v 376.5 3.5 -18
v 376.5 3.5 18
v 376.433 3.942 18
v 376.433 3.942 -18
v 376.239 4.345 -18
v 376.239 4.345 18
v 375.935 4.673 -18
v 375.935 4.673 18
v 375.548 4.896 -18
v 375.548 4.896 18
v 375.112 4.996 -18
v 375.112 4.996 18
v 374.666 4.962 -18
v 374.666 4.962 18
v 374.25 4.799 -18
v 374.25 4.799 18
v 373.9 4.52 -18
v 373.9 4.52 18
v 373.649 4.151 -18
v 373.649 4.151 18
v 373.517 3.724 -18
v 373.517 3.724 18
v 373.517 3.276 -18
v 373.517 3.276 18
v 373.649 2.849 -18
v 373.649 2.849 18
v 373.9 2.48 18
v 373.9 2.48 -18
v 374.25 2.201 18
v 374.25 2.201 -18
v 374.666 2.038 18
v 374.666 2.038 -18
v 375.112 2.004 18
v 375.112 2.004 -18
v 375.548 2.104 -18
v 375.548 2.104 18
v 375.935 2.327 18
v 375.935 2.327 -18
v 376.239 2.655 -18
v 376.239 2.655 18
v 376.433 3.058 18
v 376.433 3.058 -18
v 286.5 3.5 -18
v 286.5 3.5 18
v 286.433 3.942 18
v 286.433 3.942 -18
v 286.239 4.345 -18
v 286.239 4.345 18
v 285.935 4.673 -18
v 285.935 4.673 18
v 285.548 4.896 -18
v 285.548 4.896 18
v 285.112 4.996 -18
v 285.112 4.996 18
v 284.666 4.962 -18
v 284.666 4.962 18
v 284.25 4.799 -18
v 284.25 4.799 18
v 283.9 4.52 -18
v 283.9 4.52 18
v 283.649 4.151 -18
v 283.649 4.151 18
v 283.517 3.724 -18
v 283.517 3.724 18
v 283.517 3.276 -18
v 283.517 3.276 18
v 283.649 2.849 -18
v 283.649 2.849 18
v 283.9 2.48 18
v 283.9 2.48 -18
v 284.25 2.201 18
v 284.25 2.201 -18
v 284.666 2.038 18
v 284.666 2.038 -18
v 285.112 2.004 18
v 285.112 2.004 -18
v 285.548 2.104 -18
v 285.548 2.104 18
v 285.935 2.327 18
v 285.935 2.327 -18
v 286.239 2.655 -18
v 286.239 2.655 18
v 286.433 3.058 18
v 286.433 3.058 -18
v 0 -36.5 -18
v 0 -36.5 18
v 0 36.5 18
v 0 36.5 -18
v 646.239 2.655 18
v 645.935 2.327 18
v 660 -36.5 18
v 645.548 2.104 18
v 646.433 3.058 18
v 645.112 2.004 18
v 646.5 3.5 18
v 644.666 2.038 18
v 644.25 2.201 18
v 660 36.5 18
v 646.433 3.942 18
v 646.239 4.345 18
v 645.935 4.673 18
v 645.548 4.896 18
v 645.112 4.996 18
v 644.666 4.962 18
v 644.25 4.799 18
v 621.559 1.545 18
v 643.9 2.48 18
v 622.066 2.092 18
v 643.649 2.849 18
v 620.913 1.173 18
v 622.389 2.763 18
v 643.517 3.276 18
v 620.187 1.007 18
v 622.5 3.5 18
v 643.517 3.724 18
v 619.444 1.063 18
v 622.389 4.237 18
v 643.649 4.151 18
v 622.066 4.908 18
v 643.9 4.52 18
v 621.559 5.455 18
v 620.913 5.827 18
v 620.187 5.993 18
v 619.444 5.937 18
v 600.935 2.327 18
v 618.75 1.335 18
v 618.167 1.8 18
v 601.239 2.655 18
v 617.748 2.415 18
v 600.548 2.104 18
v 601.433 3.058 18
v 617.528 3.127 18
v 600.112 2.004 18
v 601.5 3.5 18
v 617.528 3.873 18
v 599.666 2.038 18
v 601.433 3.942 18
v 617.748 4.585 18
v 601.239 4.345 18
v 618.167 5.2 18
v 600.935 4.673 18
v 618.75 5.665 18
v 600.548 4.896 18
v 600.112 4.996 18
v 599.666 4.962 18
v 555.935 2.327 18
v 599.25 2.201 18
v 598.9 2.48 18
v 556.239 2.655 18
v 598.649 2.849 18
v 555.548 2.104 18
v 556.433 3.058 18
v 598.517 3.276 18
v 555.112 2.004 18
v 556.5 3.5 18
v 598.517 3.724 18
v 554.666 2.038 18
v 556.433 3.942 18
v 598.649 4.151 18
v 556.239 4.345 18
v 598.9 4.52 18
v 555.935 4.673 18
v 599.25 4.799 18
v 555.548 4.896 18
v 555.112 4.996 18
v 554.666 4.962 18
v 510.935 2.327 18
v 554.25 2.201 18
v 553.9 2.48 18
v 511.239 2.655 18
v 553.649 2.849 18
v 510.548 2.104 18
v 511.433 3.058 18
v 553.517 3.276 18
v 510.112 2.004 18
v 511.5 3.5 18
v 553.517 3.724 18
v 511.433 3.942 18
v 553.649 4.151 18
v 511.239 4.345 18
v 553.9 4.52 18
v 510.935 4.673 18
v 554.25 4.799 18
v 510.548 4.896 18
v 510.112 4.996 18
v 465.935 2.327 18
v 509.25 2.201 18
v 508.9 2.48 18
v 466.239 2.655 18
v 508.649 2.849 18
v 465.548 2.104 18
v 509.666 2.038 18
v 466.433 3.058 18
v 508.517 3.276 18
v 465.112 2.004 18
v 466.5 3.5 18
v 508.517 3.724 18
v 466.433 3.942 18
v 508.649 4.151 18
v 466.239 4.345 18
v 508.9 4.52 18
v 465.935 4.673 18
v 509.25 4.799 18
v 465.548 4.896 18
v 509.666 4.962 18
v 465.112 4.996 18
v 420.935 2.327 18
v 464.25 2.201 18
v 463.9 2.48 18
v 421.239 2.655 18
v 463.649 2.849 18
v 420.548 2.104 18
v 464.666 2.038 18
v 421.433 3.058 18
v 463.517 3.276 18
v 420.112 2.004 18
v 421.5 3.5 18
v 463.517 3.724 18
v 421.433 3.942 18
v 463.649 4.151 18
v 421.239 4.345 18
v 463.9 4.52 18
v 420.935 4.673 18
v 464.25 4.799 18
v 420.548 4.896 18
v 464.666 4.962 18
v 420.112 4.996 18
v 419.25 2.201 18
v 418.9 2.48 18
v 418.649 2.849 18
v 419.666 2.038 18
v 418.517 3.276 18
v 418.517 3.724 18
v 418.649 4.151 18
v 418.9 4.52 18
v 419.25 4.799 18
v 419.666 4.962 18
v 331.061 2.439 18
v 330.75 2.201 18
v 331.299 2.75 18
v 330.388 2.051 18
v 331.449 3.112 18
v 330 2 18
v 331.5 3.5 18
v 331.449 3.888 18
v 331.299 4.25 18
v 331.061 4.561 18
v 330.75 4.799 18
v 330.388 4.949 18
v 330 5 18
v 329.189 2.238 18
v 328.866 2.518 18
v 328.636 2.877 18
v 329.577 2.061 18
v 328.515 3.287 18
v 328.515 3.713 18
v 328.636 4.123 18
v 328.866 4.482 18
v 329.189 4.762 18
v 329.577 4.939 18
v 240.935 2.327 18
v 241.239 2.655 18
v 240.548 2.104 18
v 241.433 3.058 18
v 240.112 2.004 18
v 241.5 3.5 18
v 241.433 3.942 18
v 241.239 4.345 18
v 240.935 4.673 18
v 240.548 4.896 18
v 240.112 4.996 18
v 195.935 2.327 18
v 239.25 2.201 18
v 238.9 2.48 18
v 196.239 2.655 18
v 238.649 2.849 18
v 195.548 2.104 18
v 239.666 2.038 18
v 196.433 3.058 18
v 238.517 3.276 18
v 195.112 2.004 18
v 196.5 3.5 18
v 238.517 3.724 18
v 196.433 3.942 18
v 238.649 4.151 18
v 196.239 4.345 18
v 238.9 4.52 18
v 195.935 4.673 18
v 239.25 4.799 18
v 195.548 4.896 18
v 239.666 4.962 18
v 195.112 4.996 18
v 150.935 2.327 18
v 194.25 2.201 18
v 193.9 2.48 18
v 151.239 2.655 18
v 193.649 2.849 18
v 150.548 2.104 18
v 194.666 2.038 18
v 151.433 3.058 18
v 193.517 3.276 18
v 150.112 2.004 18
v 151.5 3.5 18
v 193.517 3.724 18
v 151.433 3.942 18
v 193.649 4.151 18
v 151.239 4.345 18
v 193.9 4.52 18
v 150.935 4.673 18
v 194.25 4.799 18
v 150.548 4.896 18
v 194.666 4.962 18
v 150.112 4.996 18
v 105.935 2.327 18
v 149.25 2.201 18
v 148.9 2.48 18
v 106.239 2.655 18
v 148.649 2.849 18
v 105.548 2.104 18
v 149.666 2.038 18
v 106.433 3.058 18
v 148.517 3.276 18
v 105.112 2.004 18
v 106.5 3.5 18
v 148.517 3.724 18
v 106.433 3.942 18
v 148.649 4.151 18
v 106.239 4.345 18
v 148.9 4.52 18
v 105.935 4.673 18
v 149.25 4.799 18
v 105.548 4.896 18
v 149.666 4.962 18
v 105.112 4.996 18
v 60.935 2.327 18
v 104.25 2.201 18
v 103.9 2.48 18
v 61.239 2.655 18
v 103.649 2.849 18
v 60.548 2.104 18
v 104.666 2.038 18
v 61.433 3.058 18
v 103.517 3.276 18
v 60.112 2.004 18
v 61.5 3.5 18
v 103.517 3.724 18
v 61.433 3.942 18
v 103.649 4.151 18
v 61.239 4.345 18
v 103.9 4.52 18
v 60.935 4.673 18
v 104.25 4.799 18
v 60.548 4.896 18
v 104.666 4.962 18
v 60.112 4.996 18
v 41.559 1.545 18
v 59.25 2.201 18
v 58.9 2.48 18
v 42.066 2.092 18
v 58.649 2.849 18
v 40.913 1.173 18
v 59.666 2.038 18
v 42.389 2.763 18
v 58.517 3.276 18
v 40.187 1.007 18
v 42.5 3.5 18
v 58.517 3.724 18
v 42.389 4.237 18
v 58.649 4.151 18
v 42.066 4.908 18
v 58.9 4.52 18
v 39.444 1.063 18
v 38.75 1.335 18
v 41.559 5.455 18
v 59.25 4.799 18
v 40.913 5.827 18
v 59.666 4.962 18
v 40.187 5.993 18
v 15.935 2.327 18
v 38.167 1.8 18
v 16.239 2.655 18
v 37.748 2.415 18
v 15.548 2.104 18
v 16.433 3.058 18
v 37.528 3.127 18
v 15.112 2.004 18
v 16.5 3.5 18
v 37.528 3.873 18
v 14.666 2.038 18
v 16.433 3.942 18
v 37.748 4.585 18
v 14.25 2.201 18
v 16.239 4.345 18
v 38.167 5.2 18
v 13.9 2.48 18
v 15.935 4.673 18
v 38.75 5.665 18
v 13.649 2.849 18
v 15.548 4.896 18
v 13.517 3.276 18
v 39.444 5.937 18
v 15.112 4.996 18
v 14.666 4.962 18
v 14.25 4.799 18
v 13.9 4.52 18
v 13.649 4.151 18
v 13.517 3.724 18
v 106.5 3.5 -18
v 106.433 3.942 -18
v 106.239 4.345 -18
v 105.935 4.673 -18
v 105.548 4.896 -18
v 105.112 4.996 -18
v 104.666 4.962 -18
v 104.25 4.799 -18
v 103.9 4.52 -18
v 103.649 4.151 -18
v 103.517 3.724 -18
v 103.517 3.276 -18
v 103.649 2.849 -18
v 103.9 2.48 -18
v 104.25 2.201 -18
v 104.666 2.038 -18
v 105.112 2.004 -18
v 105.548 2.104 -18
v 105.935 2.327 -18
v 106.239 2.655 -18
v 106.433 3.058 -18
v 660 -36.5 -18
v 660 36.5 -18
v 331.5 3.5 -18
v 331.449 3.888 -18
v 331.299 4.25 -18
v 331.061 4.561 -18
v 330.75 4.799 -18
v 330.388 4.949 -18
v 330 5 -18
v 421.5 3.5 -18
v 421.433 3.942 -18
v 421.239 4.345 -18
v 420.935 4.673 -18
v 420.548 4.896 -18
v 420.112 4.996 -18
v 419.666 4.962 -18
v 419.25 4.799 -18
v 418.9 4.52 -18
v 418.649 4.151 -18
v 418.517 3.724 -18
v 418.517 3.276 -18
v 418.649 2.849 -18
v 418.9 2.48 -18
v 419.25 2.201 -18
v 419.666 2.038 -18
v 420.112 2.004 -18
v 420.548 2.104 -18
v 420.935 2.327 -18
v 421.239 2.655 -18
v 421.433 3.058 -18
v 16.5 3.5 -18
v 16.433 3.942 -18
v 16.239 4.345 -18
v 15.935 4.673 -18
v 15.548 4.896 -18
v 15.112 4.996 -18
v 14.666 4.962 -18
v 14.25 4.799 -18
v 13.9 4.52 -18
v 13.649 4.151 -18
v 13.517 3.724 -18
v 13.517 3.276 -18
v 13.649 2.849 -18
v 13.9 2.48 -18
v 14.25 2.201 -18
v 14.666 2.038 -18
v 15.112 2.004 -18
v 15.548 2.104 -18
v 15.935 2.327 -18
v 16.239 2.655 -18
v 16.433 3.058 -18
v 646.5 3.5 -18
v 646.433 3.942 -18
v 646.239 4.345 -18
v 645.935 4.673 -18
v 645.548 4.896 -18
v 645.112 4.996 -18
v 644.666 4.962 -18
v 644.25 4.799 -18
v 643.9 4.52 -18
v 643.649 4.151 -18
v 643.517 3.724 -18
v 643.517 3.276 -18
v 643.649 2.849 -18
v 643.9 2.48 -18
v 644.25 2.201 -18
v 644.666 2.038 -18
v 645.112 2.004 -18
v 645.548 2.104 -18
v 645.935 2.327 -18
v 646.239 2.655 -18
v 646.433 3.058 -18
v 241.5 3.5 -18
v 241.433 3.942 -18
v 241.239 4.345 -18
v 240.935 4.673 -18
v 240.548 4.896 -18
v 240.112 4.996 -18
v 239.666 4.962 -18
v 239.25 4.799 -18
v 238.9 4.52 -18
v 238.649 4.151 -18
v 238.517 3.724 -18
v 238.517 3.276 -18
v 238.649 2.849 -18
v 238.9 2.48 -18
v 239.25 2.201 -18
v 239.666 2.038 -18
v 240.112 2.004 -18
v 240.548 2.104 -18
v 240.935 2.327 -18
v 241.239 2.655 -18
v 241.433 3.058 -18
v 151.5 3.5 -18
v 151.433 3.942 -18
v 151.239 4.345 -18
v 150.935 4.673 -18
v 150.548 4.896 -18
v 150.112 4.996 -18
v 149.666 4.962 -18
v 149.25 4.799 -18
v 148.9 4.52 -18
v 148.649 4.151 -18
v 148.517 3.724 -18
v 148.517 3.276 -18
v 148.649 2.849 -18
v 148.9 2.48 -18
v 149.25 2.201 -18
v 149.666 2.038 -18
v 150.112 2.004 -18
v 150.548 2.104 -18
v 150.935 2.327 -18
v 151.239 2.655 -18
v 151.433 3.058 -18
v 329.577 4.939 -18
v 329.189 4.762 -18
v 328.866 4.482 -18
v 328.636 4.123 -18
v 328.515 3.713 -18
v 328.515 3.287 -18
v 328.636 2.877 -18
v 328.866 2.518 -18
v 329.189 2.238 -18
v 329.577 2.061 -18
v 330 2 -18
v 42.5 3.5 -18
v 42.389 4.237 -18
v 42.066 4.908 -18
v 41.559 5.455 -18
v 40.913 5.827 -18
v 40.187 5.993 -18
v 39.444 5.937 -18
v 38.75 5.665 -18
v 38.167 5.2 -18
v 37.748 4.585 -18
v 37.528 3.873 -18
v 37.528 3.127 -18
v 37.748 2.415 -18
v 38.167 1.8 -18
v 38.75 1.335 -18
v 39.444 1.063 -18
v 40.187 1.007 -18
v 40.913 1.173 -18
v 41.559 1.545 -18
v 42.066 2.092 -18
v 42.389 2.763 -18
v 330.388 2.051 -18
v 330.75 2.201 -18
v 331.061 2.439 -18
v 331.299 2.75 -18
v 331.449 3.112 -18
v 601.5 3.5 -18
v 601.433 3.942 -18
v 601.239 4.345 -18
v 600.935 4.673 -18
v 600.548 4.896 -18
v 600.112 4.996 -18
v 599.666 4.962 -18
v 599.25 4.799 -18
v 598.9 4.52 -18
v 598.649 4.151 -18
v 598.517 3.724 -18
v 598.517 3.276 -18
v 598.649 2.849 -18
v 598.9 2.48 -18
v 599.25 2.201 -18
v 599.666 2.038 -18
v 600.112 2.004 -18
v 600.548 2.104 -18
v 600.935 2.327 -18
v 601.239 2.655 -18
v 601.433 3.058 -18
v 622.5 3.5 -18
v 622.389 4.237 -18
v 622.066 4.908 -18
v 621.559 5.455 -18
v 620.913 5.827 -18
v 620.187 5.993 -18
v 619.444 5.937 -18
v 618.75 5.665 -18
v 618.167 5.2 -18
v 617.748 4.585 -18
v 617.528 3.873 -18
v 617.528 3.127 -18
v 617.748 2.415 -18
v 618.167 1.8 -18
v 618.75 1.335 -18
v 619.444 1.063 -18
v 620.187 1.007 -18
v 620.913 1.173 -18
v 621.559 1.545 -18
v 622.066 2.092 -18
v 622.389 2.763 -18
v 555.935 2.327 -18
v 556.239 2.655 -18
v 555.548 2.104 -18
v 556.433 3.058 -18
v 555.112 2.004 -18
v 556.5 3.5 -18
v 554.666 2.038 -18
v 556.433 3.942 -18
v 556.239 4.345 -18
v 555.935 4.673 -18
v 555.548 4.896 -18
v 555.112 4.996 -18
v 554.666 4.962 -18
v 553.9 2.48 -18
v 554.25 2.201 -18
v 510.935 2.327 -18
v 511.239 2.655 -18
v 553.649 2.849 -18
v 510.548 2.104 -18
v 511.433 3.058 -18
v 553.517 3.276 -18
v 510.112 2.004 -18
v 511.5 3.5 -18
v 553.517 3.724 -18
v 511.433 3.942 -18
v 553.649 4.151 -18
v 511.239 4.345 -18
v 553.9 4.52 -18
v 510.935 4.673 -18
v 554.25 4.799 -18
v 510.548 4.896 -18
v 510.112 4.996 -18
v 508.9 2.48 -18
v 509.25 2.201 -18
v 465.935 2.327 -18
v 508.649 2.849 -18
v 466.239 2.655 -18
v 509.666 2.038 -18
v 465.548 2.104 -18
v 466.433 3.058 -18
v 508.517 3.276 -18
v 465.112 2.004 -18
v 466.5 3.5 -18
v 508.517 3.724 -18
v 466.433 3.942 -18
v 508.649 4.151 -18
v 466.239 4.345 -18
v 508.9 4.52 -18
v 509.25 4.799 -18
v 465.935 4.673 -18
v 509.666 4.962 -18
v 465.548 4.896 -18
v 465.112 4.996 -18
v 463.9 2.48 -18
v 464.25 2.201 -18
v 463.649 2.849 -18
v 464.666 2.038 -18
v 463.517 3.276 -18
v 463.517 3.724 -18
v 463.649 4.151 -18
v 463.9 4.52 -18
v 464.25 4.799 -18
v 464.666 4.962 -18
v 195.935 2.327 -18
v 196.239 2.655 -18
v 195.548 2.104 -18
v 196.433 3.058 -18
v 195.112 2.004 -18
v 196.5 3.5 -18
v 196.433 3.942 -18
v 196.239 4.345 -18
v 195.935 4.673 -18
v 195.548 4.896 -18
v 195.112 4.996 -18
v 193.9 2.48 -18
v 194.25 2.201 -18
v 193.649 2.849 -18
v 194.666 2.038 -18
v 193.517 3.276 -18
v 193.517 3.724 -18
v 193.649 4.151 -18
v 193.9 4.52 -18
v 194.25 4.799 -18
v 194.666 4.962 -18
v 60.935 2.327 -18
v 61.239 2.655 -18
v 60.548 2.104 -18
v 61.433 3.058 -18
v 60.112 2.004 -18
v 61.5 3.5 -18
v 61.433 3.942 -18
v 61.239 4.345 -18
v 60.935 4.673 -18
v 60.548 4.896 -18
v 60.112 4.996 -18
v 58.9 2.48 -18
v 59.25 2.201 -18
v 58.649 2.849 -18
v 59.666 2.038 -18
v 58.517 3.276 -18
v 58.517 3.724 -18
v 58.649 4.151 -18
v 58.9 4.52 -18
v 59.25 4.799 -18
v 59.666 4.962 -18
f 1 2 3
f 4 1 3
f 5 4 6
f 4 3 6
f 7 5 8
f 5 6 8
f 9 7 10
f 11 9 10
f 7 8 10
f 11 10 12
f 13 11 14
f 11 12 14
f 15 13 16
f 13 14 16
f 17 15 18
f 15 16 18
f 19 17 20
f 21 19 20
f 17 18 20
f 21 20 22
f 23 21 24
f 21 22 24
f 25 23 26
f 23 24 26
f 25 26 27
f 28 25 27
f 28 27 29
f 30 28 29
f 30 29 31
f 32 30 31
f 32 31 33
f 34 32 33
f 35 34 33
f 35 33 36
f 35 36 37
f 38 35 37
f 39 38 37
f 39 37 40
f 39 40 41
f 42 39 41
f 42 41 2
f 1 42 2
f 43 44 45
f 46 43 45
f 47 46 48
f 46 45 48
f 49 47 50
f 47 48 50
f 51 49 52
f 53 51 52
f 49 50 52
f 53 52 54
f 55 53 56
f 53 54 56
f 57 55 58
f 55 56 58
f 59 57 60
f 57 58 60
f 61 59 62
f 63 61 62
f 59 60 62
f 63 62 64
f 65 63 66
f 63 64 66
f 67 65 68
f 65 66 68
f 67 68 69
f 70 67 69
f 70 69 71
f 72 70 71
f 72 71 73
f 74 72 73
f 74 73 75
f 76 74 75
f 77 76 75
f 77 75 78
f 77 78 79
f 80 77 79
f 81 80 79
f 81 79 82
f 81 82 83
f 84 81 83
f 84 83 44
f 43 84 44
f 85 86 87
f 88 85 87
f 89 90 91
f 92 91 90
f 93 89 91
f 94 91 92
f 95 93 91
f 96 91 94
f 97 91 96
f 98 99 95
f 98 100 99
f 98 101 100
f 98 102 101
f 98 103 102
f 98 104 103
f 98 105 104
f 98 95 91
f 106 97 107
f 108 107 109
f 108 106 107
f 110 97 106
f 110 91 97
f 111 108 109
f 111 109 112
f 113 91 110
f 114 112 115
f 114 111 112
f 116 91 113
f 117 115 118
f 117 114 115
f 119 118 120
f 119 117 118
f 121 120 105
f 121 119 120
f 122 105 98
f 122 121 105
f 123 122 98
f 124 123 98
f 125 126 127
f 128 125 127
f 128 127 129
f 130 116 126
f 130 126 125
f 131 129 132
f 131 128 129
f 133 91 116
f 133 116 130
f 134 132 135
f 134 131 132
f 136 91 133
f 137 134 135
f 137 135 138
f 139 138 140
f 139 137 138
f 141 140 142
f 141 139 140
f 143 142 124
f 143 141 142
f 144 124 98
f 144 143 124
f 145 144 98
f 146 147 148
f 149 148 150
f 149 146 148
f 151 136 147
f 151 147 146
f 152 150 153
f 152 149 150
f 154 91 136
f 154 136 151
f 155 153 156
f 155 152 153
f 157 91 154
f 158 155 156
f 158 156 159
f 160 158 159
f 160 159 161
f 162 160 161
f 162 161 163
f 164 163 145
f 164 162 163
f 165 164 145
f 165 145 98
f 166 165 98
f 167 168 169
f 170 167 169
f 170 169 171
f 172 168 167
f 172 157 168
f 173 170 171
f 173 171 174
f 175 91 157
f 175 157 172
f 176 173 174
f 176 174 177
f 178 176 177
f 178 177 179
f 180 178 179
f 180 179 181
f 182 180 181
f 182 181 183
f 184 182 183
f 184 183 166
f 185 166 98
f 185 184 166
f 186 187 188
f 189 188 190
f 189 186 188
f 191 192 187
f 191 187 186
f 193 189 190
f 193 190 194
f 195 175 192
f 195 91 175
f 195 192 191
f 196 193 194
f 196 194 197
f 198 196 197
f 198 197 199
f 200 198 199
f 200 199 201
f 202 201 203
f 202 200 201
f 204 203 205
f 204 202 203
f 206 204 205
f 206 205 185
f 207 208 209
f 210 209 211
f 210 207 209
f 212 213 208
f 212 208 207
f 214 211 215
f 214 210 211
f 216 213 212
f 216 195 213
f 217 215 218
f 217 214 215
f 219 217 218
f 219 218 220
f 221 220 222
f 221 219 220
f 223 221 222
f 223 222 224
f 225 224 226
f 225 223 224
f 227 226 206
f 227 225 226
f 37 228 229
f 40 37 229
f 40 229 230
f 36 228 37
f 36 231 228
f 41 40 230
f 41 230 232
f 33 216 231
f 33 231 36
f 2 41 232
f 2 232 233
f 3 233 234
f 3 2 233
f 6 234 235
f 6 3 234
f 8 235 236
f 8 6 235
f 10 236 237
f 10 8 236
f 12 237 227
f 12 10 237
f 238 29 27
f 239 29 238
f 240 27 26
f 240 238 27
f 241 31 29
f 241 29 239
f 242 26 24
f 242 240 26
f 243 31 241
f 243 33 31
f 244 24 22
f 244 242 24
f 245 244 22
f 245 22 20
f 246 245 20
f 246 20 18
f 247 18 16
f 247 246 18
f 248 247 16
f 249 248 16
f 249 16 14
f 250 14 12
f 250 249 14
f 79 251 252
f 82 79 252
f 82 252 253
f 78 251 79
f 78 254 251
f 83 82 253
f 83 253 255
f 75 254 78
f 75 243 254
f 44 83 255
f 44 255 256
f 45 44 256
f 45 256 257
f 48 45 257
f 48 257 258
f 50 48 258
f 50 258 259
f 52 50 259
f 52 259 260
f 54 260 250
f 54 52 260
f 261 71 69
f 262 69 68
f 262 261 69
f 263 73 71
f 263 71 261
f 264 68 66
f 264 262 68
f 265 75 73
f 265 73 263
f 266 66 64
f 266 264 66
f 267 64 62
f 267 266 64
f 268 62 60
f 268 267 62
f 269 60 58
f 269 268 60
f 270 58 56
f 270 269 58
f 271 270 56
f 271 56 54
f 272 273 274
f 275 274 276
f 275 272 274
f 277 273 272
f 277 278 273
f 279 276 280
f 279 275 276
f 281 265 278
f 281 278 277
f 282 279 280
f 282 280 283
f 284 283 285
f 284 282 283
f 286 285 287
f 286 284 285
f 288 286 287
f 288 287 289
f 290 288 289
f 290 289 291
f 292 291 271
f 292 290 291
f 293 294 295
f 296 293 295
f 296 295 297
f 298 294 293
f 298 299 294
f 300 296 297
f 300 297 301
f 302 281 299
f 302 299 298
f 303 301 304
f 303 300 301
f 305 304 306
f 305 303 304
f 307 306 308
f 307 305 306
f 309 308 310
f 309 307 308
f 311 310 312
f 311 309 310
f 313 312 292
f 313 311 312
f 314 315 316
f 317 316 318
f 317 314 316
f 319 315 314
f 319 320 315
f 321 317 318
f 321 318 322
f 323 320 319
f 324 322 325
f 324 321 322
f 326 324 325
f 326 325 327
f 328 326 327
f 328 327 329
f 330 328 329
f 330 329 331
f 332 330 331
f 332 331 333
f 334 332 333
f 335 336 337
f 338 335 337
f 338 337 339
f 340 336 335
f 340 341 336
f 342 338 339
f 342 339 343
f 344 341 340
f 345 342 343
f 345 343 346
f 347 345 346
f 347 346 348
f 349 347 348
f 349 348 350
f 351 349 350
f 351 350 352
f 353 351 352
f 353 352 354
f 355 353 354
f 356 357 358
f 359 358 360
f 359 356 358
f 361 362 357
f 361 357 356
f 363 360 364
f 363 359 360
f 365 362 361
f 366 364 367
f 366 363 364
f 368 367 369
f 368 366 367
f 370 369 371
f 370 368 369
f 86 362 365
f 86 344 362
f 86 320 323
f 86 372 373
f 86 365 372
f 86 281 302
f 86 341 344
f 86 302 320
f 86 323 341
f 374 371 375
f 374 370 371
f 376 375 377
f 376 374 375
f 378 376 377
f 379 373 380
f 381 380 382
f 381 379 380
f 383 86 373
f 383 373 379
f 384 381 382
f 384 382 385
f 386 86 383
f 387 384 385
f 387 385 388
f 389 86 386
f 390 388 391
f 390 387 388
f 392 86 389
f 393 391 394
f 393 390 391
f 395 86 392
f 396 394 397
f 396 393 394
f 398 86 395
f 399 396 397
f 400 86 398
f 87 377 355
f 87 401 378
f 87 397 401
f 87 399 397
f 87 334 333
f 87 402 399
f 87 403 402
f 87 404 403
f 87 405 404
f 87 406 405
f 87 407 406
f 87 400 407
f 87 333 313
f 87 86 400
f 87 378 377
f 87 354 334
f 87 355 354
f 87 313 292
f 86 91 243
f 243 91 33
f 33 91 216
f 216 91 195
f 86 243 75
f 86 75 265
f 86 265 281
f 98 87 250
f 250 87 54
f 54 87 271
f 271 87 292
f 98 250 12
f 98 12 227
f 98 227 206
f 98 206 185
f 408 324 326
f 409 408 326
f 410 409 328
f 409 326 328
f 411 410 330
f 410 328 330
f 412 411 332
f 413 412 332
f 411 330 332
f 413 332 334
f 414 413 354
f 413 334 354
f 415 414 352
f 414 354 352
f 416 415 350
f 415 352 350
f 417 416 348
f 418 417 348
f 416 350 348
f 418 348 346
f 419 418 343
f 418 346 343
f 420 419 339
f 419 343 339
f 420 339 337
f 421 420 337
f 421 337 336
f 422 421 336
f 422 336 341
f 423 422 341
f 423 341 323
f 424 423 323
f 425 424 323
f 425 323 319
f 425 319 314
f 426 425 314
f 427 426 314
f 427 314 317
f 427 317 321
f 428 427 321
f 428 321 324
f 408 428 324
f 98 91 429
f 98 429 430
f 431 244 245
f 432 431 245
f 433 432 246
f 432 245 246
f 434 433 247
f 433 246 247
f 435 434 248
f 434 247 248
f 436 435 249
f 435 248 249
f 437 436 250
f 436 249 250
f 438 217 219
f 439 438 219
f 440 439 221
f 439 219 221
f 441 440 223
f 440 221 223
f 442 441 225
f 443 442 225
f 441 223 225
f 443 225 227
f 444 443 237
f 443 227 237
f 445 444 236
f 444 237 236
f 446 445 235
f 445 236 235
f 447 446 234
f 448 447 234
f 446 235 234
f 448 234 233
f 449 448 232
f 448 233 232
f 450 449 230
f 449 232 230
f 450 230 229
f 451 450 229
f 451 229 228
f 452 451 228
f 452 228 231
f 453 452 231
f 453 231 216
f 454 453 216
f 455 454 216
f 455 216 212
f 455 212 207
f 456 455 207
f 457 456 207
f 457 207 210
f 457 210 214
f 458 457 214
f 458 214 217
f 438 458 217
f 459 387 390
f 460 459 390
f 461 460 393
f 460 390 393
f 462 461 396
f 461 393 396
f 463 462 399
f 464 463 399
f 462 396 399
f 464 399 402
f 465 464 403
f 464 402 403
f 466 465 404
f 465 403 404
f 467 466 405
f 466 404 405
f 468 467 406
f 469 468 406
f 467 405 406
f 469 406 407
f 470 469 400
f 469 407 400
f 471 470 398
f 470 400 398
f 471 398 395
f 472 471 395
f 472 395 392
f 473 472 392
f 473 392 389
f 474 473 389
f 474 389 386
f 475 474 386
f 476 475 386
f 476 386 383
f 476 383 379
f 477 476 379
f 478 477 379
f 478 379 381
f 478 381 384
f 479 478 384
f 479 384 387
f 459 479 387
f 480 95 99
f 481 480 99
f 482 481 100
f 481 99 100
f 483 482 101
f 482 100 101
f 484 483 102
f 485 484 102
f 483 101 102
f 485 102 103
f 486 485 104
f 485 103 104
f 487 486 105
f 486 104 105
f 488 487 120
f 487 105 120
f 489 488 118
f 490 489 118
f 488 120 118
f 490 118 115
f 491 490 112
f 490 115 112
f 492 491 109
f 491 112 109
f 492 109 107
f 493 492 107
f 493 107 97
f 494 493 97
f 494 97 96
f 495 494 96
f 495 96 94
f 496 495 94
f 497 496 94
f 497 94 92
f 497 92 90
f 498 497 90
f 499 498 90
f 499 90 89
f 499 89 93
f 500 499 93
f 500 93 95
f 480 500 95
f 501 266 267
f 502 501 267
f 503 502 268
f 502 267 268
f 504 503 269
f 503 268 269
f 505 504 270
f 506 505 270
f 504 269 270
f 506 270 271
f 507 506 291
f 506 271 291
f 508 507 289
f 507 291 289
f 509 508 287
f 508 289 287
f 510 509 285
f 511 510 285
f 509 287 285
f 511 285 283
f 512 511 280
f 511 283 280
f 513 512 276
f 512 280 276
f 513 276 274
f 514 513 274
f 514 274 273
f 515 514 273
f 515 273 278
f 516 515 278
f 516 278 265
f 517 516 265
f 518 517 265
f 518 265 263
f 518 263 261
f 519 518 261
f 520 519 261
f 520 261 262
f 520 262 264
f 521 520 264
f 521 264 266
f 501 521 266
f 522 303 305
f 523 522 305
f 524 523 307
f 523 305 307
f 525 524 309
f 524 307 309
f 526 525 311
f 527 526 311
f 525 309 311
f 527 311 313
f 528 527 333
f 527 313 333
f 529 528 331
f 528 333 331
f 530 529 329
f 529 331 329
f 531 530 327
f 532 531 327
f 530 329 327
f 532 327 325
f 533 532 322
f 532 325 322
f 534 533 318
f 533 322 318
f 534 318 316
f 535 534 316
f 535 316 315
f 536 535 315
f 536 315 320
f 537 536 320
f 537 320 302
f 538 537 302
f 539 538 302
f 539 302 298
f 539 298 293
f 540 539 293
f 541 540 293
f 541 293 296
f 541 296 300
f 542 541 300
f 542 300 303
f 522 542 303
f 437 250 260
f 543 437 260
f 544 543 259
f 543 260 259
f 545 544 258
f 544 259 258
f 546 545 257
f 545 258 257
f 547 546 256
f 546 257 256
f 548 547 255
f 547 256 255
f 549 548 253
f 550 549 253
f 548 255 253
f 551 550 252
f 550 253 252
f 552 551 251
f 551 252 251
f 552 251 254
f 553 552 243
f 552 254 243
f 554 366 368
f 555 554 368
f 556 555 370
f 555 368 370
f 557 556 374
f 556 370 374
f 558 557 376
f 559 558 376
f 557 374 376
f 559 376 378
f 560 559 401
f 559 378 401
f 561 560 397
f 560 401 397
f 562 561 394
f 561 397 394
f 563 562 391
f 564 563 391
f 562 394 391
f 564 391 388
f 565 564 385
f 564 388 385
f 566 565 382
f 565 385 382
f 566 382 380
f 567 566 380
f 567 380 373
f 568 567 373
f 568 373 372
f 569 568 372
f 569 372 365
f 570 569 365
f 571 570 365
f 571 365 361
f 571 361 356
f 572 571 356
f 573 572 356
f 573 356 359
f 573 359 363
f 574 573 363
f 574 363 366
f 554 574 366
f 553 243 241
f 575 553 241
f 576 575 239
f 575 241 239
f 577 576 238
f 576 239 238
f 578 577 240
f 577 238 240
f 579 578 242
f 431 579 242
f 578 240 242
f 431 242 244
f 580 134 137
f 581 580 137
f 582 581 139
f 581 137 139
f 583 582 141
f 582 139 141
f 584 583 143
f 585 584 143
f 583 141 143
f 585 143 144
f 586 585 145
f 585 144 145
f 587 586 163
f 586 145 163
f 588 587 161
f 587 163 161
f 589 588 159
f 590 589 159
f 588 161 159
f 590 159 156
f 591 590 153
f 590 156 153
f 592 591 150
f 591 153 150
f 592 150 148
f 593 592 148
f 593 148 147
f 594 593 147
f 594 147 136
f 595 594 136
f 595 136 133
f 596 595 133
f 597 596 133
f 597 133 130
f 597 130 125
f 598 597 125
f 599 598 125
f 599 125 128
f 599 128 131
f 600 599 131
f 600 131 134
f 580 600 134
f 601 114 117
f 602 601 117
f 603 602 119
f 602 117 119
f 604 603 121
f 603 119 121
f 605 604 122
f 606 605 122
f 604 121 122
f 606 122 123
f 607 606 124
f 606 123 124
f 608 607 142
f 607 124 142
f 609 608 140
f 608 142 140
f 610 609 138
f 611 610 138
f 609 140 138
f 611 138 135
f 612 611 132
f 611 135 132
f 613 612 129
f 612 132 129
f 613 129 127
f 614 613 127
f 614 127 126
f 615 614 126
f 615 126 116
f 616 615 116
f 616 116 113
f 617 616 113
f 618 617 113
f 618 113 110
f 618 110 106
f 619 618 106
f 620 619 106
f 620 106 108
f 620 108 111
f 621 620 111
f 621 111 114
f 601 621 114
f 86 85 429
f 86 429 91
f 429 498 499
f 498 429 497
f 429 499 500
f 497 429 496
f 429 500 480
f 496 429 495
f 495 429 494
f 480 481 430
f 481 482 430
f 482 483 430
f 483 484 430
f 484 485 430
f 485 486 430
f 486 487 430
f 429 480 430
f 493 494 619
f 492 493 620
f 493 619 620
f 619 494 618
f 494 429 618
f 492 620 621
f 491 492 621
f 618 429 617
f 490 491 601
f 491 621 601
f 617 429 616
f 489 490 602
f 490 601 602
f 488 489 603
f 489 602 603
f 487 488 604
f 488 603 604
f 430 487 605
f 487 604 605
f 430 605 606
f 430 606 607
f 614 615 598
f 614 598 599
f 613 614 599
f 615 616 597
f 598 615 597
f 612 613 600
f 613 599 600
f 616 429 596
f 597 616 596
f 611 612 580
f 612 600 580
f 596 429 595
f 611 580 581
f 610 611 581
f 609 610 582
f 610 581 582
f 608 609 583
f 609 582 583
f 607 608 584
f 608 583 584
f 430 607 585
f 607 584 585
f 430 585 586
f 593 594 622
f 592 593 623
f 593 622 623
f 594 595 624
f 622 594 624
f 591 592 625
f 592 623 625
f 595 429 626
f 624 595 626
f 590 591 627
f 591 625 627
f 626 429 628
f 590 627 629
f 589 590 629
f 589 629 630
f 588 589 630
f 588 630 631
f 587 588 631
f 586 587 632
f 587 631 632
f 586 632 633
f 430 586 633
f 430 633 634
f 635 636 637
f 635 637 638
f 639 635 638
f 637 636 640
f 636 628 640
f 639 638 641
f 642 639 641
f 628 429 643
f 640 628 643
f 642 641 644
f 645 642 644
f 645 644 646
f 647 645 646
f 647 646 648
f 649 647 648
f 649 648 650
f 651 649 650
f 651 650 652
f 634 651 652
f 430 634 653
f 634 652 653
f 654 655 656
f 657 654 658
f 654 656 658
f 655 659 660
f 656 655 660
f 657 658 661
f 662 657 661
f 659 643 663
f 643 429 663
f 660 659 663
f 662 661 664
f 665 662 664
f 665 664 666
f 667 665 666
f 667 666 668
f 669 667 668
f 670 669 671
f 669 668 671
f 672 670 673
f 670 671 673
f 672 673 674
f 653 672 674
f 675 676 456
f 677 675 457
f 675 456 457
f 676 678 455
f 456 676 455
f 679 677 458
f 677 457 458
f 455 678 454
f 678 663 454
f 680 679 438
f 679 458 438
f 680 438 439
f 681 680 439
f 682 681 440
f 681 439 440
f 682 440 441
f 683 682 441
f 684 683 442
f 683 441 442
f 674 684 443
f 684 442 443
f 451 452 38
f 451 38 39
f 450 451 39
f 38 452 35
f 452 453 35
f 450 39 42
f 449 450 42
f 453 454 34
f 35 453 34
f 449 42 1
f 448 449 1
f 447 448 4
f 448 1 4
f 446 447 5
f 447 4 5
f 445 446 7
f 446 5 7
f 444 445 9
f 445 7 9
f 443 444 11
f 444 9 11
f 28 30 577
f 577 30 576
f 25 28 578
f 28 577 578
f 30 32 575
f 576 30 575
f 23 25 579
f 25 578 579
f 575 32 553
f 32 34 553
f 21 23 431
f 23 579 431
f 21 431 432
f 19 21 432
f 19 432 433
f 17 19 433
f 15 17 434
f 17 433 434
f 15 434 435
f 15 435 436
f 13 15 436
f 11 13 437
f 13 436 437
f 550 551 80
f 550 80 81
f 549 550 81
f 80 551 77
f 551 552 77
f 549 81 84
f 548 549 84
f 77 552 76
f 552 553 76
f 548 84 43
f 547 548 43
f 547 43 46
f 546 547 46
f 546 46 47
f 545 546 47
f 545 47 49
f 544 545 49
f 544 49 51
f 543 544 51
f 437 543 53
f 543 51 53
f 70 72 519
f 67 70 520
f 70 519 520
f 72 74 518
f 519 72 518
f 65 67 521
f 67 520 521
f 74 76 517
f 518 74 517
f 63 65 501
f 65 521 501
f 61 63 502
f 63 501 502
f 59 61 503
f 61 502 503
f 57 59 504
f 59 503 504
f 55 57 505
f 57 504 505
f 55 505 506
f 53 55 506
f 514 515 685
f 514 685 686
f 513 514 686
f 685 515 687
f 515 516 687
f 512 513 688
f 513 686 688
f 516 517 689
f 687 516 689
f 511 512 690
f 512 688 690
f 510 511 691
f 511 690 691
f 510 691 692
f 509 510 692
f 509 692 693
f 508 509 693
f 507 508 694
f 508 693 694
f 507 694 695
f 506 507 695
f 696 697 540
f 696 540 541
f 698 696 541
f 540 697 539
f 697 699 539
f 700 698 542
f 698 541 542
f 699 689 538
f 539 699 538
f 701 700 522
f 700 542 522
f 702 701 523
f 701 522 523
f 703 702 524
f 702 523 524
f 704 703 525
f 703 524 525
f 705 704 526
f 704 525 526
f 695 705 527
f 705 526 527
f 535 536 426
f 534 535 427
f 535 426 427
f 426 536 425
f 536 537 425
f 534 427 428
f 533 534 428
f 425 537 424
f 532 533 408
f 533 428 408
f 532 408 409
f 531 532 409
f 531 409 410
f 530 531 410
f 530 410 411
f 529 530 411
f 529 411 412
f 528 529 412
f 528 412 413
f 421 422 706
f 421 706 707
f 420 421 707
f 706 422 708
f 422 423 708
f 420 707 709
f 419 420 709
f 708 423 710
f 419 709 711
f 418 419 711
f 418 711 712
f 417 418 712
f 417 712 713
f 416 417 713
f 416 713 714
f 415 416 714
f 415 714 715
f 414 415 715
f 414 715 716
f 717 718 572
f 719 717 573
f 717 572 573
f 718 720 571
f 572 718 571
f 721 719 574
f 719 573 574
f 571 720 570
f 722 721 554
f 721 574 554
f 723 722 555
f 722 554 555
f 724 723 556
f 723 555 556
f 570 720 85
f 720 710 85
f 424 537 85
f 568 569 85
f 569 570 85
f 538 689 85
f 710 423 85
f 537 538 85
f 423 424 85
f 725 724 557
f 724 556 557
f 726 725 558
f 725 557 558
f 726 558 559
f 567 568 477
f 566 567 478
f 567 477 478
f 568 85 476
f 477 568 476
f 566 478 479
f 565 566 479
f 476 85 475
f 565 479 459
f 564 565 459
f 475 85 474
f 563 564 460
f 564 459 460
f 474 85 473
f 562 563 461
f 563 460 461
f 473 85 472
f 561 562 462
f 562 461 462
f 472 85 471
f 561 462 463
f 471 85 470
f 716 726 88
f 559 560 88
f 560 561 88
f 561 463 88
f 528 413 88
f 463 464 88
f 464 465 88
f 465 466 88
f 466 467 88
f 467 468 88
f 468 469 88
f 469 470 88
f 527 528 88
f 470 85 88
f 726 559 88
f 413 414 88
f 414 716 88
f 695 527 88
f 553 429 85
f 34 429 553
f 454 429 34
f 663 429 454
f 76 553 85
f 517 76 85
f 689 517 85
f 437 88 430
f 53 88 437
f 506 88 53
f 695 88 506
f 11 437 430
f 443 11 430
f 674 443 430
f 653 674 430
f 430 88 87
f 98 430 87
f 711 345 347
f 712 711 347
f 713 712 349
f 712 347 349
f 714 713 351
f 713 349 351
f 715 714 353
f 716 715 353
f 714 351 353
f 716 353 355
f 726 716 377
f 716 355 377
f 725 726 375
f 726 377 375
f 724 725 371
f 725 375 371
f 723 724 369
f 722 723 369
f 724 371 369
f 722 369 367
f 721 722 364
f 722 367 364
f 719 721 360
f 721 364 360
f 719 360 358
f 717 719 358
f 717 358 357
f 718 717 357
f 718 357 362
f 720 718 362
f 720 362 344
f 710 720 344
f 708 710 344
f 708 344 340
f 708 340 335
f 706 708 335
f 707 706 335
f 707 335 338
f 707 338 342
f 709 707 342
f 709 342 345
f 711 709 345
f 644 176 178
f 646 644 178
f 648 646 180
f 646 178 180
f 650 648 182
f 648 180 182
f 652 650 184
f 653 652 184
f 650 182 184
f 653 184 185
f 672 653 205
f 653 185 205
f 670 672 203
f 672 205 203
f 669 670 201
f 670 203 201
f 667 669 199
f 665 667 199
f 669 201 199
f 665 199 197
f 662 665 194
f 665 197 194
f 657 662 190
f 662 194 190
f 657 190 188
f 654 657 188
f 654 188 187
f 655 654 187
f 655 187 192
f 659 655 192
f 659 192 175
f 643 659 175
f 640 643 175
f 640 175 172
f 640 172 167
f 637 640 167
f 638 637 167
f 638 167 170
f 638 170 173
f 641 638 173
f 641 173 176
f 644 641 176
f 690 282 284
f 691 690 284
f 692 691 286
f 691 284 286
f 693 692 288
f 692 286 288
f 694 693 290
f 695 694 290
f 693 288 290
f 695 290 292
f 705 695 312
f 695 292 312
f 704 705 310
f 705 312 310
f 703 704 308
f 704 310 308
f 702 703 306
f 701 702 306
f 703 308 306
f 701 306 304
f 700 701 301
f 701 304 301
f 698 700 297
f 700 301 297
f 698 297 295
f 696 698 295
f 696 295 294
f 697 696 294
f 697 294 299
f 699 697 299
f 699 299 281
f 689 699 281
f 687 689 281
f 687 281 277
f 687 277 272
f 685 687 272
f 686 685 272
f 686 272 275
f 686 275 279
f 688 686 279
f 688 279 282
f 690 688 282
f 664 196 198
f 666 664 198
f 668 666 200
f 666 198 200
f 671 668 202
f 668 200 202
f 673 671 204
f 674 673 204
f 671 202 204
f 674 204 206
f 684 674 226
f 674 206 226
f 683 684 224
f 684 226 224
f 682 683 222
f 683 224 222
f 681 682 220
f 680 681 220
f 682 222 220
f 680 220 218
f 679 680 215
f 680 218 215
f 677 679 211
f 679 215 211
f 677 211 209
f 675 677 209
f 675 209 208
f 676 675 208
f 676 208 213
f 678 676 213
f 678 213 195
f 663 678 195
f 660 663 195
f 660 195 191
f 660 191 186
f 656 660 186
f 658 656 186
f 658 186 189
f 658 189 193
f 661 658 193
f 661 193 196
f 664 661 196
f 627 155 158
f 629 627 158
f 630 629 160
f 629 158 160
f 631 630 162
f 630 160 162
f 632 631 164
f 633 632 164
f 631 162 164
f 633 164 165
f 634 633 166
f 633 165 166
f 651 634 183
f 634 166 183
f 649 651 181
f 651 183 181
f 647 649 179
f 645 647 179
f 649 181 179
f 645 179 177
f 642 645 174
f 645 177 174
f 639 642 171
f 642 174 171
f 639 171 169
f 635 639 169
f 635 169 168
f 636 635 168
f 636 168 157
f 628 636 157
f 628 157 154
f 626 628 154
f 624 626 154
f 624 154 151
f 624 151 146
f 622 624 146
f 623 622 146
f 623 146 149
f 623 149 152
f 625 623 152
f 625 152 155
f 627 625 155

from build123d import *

# Parameters (mm, degrees)
F0_W     = 73
F0_H     = 36
F1_DEPTH = 660
F2_R     = 1.5
F2_R_2   = 2.5
F3_DEPTH = 40


with BuildPart() as f1:
    # F0 (on Right) → F1 (new body)
    with BuildSketch(Plane.YZ):
        Rectangle(F0_W, F0_H)
    extrude(amount=F1_DEPTH)

    # F2 (on face) → F3 (cut)
    with BuildSketch(Plane.XY.offset(18)):
        with Locations((15, 3.5)):
            Circle(F2_R)
        with Locations((40, 3.5)):
            Circle(F2_R_2)
        with Locations((60, 3.5)):
            Circle(F2_R)
        with Locations((150, 3.5)):
            Circle(F2_R)
        with Locations((105, 3.5)):
            Circle(F2_R)
        with Locations((195, 3.5)):
            Circle(F2_R)
        with Locations((240, 3.5)):
            Circle(F2_R)
        with Locations((285, 3.5)):
            Circle(F2_R)
        with BuildLine():
            ThreePointArc((330, 5), (328.5, 3.5), (330, 2))
            Line((330, 2), (330, 5))
        make_face()
        with Locations((375, 3.5)):
            Circle(F2_R)
        with BuildLine():
            Line((330, 5), (330, 2))
            ThreePointArc((330, 2), (331.0606601718, 2.4393398282), (331.5, 3.5))
            ThreePointArc((331.5, 3.5), (331.0606601718, 4.5606601718), (330, 5))
        make_face()
        with Locations((420, 3.5)):
            Circle(F2_R)
        with Locations((465, 3.5)):
            Circle(F2_R)
        with Locations((510, 3.5)):
            Circle(F2_R)
        with Locations((555, 3.5)):
            Circle(F2_R)
        with Locations((600, 3.5)):
            Circle(F2_R)
        with Locations((620, 3.5)):
            Circle(F2_R_2)
        with Locations((645, 3.5)):
            Circle(F2_R)
    extrude(amount=-F3_DEPTH, mode=Mode.SUBTRACT)


solid = f1.part
